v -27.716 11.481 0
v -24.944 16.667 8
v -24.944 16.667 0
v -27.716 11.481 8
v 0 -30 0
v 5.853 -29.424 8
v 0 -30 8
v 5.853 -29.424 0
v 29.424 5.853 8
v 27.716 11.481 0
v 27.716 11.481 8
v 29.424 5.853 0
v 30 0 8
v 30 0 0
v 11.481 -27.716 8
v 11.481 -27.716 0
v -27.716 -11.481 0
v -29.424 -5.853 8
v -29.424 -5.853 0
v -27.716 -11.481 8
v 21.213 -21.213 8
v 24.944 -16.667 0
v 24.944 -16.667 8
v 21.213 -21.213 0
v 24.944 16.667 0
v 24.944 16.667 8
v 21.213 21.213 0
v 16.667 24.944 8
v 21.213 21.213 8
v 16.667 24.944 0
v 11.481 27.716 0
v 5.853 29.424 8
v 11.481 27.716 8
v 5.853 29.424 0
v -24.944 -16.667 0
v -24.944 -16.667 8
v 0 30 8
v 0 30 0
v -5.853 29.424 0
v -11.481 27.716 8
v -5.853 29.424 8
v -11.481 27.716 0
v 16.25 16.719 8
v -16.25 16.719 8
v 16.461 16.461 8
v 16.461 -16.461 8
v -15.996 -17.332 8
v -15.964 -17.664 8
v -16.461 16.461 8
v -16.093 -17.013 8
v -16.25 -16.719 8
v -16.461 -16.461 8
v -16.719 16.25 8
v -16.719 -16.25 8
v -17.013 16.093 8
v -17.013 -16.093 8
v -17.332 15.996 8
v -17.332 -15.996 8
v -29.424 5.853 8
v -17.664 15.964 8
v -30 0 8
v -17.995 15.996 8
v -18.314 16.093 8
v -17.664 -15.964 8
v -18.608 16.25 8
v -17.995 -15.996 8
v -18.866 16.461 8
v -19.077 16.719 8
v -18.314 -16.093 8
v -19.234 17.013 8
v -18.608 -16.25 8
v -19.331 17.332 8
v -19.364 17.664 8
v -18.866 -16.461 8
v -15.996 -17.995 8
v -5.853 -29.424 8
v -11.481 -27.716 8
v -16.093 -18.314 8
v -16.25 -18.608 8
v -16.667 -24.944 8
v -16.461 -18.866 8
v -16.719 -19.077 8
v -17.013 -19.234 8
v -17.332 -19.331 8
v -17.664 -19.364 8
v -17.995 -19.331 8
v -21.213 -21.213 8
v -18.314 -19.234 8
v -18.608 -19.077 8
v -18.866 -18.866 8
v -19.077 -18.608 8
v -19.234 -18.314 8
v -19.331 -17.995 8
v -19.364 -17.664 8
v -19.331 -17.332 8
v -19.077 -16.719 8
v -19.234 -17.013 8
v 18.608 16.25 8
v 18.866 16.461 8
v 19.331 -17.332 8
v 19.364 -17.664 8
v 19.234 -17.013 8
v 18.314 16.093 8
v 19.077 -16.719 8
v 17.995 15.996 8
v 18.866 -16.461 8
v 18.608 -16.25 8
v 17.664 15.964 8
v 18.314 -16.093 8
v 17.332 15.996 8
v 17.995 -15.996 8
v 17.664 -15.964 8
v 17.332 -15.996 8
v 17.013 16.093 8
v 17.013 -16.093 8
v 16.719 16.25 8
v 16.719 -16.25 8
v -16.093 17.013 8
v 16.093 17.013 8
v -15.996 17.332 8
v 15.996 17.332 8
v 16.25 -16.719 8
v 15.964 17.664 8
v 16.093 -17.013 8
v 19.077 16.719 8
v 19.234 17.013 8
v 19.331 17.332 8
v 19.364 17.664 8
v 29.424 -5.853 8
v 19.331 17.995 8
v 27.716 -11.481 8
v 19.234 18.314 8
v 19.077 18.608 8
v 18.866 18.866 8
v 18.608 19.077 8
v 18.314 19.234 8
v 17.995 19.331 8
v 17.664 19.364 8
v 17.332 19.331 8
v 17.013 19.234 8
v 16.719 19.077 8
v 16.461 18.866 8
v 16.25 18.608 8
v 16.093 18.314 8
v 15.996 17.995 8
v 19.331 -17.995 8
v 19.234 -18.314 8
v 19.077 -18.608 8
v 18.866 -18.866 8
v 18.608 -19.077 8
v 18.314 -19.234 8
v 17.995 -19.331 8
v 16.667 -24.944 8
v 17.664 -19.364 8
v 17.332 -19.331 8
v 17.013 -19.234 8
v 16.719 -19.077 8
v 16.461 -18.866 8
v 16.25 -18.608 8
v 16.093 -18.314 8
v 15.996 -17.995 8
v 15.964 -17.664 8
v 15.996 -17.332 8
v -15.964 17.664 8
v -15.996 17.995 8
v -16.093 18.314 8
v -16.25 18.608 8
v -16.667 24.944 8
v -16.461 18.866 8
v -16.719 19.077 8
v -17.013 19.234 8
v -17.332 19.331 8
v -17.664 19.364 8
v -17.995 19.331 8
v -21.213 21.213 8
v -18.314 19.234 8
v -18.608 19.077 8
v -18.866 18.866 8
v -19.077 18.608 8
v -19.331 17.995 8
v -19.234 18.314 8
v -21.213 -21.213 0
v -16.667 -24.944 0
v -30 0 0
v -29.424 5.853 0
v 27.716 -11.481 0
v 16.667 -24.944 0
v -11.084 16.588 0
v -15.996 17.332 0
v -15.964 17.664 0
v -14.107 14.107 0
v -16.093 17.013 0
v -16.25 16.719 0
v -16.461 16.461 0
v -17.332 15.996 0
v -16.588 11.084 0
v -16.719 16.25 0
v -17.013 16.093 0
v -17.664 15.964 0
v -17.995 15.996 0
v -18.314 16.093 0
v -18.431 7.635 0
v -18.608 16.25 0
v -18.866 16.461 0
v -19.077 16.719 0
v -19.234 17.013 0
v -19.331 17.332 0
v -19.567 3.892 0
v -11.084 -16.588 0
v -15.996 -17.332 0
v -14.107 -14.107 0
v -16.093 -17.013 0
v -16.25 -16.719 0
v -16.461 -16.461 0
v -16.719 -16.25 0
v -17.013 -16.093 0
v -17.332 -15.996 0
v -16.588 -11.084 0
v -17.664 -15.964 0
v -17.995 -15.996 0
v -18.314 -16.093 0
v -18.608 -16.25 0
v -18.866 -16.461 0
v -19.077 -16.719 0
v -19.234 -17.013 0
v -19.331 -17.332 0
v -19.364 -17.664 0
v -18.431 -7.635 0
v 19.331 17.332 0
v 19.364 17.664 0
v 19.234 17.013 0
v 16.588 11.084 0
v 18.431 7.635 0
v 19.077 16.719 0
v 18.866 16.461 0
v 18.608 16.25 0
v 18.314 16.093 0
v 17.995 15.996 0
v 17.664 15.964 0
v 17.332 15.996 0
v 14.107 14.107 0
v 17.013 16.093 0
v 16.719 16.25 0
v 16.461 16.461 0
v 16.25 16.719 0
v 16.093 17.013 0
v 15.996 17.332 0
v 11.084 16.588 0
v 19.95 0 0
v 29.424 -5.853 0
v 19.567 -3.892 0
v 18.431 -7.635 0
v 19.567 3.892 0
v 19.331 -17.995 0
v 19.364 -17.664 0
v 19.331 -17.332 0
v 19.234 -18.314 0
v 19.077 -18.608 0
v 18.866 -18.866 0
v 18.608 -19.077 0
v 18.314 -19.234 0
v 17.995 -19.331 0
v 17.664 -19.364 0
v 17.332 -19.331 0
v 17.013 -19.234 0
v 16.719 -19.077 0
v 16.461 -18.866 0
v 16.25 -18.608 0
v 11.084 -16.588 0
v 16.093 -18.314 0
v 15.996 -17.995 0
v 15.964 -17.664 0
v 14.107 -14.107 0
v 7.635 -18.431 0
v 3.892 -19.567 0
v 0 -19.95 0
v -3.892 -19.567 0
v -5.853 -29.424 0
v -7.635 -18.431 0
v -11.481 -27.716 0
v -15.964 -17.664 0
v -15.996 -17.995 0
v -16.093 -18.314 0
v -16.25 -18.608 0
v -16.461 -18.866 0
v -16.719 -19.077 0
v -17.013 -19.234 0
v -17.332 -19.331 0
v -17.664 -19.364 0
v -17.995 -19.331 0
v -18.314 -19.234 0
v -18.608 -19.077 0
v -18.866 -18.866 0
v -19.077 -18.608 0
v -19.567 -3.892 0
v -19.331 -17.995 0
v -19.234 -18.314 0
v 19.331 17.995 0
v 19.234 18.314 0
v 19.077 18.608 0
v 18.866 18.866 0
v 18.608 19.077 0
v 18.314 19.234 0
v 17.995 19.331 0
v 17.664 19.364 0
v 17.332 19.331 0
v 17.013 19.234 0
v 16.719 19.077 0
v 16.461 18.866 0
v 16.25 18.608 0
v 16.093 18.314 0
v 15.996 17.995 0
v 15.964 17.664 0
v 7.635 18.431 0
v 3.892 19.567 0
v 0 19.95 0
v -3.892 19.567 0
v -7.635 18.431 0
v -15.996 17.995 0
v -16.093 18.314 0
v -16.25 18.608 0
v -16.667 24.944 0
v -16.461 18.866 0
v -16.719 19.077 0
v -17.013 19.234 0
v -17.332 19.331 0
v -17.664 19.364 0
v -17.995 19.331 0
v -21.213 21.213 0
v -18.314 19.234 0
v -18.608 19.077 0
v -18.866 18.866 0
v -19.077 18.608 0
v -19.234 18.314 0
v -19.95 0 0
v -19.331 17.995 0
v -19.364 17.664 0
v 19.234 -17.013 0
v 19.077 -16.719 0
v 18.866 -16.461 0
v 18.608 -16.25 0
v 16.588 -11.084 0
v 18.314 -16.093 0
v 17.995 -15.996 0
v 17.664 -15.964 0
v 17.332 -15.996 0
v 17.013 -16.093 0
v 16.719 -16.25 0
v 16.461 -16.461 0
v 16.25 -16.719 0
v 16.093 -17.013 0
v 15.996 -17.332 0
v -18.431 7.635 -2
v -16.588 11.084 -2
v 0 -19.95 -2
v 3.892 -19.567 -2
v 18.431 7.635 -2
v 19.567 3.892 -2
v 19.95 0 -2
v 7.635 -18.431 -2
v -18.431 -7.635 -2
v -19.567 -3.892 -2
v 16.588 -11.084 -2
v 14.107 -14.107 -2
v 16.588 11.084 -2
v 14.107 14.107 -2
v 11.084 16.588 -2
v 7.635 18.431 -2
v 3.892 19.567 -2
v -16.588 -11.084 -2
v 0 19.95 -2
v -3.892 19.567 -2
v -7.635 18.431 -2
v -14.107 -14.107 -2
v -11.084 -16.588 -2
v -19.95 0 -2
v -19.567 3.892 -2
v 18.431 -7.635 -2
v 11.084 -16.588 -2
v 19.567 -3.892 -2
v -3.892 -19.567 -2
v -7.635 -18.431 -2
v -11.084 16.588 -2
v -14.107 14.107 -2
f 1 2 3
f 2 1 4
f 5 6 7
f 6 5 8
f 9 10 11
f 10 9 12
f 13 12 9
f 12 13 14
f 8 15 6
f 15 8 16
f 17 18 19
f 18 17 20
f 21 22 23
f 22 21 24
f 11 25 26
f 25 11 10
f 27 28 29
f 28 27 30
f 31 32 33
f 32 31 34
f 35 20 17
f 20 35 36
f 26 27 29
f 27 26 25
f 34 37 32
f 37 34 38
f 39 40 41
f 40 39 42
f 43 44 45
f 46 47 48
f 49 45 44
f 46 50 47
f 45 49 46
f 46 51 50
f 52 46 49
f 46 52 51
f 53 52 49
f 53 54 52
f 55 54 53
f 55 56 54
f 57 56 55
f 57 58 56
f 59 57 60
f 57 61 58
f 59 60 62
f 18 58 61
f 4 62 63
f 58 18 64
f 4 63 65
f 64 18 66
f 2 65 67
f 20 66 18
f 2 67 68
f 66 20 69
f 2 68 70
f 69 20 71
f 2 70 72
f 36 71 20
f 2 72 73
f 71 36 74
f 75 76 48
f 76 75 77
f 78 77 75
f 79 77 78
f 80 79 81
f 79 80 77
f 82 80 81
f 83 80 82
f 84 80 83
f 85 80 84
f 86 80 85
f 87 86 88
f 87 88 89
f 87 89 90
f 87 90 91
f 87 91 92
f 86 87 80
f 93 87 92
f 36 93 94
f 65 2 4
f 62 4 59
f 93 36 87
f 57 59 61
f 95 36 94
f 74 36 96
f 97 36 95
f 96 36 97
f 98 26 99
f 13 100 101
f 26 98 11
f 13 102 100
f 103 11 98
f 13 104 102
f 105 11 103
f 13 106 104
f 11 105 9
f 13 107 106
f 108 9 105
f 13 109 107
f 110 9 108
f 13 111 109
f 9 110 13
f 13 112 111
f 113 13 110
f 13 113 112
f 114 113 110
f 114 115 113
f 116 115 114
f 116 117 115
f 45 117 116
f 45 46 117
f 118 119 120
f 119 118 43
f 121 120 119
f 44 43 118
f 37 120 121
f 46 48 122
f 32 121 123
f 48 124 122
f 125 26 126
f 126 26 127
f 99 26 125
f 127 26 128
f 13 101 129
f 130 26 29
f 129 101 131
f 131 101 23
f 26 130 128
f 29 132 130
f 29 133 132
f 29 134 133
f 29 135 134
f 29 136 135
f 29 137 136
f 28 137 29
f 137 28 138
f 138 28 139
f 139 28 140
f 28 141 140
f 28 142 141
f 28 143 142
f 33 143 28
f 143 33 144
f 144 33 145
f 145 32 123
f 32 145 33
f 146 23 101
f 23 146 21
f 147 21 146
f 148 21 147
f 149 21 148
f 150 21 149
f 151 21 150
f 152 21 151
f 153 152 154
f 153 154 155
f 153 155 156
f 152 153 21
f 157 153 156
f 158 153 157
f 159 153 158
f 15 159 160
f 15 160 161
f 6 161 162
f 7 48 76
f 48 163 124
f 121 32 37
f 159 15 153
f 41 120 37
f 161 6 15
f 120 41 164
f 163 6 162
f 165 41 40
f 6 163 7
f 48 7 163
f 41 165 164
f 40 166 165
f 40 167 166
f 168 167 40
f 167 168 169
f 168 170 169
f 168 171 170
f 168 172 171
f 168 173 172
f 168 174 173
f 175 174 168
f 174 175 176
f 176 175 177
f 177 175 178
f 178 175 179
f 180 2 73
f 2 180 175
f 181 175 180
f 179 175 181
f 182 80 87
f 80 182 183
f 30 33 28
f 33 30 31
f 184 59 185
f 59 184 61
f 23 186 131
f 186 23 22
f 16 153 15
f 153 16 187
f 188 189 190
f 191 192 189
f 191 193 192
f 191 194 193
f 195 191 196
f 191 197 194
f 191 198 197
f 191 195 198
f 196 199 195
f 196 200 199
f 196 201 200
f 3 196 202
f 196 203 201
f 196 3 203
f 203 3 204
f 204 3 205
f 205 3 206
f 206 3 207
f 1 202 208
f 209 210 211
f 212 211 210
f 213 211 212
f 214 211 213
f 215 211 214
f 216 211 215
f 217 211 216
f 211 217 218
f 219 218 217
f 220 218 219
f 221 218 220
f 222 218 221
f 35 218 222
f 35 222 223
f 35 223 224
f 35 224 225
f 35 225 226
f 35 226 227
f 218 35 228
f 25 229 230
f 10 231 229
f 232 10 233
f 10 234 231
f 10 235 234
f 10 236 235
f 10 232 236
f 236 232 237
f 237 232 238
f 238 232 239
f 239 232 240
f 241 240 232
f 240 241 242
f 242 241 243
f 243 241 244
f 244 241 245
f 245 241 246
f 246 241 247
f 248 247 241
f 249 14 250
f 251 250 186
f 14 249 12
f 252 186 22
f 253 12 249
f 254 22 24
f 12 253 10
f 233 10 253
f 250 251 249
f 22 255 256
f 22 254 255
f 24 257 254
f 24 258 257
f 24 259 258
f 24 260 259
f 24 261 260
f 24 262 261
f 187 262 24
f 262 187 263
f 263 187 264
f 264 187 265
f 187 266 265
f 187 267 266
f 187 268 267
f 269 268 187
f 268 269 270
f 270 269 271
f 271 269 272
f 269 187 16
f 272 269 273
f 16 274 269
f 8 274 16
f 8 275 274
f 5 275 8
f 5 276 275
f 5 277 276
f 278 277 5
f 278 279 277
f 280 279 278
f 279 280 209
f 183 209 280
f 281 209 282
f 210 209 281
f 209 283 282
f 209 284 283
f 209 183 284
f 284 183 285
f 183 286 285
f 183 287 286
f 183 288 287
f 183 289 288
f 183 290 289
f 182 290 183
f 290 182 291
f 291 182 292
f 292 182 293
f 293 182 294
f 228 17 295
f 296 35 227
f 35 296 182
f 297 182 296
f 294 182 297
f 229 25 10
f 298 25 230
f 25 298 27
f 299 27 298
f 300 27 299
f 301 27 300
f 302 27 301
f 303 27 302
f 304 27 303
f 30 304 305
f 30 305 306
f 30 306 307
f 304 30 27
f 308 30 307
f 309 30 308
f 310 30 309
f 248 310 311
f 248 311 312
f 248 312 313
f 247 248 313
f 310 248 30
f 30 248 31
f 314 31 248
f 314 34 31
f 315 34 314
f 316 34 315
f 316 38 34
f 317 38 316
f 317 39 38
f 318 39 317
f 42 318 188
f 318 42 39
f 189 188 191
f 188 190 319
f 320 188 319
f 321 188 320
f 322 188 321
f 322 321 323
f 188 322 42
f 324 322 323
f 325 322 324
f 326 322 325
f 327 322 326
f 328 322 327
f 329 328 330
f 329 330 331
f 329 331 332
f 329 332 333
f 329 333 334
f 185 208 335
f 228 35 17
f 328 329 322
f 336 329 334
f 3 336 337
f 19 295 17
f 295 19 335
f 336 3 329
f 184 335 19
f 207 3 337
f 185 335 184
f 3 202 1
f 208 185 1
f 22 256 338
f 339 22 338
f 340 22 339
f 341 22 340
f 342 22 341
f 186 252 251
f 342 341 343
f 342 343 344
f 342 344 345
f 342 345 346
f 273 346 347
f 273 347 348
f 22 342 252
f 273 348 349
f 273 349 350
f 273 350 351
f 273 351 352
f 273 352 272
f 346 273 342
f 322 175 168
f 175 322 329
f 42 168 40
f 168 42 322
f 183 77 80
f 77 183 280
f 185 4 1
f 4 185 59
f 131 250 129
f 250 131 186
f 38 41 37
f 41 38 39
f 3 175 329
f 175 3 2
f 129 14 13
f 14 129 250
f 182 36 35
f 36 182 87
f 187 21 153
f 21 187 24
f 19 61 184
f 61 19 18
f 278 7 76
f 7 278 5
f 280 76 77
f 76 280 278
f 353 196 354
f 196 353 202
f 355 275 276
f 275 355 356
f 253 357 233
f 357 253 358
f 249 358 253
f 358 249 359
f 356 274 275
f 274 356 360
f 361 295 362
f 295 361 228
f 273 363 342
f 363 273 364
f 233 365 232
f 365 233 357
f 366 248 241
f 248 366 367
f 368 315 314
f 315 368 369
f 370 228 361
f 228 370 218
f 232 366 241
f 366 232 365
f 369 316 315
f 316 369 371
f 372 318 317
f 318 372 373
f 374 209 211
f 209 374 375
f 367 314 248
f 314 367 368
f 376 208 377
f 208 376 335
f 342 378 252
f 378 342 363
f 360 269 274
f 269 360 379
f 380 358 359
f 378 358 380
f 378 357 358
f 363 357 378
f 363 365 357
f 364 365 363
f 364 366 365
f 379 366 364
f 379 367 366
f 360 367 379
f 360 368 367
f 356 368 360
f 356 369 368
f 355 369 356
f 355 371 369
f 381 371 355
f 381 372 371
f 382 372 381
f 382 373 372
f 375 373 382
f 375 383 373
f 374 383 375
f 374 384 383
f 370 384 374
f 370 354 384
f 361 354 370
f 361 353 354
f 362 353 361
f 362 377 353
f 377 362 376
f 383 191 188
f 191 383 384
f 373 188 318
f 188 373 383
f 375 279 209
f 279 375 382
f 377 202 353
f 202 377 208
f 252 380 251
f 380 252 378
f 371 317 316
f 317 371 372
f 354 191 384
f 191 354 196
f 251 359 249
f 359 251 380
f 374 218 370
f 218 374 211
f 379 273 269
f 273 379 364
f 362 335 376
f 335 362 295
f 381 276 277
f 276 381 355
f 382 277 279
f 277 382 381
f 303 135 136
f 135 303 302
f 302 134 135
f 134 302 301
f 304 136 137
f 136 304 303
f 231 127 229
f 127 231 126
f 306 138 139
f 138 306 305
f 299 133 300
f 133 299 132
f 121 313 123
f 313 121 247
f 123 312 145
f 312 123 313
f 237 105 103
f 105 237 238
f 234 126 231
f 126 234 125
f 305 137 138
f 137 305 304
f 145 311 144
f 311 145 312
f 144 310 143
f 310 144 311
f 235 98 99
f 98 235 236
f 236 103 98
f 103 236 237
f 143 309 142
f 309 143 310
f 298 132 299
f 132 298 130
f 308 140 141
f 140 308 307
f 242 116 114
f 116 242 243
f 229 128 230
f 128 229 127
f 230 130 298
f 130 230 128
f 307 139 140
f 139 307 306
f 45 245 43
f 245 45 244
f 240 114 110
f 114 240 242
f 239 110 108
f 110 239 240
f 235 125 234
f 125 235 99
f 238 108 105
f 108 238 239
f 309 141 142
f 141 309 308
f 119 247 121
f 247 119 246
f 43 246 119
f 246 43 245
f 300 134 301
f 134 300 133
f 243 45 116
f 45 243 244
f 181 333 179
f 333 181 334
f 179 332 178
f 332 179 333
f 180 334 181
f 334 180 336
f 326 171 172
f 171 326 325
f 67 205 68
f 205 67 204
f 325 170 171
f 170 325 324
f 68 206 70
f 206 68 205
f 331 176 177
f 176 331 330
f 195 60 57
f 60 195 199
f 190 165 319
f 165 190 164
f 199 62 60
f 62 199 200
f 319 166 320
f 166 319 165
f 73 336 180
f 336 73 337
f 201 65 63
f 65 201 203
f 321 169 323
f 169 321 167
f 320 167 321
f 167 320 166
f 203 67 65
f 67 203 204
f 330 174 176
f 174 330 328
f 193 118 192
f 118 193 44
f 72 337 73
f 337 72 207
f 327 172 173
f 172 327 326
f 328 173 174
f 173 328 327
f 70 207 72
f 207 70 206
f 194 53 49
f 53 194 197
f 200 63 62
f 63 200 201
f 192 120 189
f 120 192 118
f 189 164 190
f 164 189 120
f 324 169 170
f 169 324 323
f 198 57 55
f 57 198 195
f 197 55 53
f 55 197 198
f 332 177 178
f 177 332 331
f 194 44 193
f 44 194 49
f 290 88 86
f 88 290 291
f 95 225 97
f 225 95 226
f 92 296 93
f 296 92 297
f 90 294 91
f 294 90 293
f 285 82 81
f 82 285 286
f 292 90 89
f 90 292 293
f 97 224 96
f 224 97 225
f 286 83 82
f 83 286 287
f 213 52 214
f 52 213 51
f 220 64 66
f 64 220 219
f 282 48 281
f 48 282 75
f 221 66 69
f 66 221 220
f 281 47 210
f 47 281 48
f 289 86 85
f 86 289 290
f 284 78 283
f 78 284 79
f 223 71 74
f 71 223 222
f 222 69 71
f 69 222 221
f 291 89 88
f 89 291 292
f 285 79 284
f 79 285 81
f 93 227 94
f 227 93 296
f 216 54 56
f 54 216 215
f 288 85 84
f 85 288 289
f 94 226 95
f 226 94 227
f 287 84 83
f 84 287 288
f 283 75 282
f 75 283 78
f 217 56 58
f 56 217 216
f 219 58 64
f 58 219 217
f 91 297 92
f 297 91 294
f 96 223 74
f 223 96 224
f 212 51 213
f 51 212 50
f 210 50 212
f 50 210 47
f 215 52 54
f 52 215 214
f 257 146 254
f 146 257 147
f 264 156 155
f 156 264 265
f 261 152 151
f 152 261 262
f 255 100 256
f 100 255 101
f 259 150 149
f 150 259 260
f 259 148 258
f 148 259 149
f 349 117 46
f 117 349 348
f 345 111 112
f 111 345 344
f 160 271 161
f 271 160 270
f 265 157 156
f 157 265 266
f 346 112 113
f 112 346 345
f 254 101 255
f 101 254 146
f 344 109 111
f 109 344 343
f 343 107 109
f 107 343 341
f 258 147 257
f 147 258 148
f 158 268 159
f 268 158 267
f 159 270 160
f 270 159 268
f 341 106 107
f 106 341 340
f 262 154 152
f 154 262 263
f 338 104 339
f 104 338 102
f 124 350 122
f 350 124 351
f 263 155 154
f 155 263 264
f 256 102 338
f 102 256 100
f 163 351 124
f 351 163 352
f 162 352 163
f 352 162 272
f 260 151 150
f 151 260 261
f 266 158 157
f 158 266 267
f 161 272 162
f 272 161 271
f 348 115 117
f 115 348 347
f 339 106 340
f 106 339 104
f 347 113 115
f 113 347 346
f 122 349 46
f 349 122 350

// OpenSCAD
$fn = 32;

// ----------------------------------------------------------------------
// Retaining cap: 6203 cover, 60 mm, spigot 39.9 mm
// ----------------------------------------------------------------------

// --- parameters (mm) ---
plate_d = 60;             // cover diameter
plate_t = 8;              // cover thickness
boss_d = 39.9;            // spigot that enters the housing
boss_h = 2;               // spigot height
bolt_d = 3.4;             // bolt clearance
bolt_r = 24.98;           // bolt circle radius

module cover() {
  cylinder(h = plate_t, d = plate_d);
}

module spigot() {
  /* sunk 1 mm into the cover; the spigot sets the overall height */
  translate([0, 0, -boss_h]) cylinder(h = boss_h + 1, d = boss_d);
}

difference() {
  union() {
    cover();
    spigot();
  }
  for (i = [0 : 3]) rotate([0, 0, 45 + i * 90]) translate([bolt_r, 0, -boss_h - 1])
    cylinder(h = boss_h + plate_t + 2, d = bolt_d);
}
